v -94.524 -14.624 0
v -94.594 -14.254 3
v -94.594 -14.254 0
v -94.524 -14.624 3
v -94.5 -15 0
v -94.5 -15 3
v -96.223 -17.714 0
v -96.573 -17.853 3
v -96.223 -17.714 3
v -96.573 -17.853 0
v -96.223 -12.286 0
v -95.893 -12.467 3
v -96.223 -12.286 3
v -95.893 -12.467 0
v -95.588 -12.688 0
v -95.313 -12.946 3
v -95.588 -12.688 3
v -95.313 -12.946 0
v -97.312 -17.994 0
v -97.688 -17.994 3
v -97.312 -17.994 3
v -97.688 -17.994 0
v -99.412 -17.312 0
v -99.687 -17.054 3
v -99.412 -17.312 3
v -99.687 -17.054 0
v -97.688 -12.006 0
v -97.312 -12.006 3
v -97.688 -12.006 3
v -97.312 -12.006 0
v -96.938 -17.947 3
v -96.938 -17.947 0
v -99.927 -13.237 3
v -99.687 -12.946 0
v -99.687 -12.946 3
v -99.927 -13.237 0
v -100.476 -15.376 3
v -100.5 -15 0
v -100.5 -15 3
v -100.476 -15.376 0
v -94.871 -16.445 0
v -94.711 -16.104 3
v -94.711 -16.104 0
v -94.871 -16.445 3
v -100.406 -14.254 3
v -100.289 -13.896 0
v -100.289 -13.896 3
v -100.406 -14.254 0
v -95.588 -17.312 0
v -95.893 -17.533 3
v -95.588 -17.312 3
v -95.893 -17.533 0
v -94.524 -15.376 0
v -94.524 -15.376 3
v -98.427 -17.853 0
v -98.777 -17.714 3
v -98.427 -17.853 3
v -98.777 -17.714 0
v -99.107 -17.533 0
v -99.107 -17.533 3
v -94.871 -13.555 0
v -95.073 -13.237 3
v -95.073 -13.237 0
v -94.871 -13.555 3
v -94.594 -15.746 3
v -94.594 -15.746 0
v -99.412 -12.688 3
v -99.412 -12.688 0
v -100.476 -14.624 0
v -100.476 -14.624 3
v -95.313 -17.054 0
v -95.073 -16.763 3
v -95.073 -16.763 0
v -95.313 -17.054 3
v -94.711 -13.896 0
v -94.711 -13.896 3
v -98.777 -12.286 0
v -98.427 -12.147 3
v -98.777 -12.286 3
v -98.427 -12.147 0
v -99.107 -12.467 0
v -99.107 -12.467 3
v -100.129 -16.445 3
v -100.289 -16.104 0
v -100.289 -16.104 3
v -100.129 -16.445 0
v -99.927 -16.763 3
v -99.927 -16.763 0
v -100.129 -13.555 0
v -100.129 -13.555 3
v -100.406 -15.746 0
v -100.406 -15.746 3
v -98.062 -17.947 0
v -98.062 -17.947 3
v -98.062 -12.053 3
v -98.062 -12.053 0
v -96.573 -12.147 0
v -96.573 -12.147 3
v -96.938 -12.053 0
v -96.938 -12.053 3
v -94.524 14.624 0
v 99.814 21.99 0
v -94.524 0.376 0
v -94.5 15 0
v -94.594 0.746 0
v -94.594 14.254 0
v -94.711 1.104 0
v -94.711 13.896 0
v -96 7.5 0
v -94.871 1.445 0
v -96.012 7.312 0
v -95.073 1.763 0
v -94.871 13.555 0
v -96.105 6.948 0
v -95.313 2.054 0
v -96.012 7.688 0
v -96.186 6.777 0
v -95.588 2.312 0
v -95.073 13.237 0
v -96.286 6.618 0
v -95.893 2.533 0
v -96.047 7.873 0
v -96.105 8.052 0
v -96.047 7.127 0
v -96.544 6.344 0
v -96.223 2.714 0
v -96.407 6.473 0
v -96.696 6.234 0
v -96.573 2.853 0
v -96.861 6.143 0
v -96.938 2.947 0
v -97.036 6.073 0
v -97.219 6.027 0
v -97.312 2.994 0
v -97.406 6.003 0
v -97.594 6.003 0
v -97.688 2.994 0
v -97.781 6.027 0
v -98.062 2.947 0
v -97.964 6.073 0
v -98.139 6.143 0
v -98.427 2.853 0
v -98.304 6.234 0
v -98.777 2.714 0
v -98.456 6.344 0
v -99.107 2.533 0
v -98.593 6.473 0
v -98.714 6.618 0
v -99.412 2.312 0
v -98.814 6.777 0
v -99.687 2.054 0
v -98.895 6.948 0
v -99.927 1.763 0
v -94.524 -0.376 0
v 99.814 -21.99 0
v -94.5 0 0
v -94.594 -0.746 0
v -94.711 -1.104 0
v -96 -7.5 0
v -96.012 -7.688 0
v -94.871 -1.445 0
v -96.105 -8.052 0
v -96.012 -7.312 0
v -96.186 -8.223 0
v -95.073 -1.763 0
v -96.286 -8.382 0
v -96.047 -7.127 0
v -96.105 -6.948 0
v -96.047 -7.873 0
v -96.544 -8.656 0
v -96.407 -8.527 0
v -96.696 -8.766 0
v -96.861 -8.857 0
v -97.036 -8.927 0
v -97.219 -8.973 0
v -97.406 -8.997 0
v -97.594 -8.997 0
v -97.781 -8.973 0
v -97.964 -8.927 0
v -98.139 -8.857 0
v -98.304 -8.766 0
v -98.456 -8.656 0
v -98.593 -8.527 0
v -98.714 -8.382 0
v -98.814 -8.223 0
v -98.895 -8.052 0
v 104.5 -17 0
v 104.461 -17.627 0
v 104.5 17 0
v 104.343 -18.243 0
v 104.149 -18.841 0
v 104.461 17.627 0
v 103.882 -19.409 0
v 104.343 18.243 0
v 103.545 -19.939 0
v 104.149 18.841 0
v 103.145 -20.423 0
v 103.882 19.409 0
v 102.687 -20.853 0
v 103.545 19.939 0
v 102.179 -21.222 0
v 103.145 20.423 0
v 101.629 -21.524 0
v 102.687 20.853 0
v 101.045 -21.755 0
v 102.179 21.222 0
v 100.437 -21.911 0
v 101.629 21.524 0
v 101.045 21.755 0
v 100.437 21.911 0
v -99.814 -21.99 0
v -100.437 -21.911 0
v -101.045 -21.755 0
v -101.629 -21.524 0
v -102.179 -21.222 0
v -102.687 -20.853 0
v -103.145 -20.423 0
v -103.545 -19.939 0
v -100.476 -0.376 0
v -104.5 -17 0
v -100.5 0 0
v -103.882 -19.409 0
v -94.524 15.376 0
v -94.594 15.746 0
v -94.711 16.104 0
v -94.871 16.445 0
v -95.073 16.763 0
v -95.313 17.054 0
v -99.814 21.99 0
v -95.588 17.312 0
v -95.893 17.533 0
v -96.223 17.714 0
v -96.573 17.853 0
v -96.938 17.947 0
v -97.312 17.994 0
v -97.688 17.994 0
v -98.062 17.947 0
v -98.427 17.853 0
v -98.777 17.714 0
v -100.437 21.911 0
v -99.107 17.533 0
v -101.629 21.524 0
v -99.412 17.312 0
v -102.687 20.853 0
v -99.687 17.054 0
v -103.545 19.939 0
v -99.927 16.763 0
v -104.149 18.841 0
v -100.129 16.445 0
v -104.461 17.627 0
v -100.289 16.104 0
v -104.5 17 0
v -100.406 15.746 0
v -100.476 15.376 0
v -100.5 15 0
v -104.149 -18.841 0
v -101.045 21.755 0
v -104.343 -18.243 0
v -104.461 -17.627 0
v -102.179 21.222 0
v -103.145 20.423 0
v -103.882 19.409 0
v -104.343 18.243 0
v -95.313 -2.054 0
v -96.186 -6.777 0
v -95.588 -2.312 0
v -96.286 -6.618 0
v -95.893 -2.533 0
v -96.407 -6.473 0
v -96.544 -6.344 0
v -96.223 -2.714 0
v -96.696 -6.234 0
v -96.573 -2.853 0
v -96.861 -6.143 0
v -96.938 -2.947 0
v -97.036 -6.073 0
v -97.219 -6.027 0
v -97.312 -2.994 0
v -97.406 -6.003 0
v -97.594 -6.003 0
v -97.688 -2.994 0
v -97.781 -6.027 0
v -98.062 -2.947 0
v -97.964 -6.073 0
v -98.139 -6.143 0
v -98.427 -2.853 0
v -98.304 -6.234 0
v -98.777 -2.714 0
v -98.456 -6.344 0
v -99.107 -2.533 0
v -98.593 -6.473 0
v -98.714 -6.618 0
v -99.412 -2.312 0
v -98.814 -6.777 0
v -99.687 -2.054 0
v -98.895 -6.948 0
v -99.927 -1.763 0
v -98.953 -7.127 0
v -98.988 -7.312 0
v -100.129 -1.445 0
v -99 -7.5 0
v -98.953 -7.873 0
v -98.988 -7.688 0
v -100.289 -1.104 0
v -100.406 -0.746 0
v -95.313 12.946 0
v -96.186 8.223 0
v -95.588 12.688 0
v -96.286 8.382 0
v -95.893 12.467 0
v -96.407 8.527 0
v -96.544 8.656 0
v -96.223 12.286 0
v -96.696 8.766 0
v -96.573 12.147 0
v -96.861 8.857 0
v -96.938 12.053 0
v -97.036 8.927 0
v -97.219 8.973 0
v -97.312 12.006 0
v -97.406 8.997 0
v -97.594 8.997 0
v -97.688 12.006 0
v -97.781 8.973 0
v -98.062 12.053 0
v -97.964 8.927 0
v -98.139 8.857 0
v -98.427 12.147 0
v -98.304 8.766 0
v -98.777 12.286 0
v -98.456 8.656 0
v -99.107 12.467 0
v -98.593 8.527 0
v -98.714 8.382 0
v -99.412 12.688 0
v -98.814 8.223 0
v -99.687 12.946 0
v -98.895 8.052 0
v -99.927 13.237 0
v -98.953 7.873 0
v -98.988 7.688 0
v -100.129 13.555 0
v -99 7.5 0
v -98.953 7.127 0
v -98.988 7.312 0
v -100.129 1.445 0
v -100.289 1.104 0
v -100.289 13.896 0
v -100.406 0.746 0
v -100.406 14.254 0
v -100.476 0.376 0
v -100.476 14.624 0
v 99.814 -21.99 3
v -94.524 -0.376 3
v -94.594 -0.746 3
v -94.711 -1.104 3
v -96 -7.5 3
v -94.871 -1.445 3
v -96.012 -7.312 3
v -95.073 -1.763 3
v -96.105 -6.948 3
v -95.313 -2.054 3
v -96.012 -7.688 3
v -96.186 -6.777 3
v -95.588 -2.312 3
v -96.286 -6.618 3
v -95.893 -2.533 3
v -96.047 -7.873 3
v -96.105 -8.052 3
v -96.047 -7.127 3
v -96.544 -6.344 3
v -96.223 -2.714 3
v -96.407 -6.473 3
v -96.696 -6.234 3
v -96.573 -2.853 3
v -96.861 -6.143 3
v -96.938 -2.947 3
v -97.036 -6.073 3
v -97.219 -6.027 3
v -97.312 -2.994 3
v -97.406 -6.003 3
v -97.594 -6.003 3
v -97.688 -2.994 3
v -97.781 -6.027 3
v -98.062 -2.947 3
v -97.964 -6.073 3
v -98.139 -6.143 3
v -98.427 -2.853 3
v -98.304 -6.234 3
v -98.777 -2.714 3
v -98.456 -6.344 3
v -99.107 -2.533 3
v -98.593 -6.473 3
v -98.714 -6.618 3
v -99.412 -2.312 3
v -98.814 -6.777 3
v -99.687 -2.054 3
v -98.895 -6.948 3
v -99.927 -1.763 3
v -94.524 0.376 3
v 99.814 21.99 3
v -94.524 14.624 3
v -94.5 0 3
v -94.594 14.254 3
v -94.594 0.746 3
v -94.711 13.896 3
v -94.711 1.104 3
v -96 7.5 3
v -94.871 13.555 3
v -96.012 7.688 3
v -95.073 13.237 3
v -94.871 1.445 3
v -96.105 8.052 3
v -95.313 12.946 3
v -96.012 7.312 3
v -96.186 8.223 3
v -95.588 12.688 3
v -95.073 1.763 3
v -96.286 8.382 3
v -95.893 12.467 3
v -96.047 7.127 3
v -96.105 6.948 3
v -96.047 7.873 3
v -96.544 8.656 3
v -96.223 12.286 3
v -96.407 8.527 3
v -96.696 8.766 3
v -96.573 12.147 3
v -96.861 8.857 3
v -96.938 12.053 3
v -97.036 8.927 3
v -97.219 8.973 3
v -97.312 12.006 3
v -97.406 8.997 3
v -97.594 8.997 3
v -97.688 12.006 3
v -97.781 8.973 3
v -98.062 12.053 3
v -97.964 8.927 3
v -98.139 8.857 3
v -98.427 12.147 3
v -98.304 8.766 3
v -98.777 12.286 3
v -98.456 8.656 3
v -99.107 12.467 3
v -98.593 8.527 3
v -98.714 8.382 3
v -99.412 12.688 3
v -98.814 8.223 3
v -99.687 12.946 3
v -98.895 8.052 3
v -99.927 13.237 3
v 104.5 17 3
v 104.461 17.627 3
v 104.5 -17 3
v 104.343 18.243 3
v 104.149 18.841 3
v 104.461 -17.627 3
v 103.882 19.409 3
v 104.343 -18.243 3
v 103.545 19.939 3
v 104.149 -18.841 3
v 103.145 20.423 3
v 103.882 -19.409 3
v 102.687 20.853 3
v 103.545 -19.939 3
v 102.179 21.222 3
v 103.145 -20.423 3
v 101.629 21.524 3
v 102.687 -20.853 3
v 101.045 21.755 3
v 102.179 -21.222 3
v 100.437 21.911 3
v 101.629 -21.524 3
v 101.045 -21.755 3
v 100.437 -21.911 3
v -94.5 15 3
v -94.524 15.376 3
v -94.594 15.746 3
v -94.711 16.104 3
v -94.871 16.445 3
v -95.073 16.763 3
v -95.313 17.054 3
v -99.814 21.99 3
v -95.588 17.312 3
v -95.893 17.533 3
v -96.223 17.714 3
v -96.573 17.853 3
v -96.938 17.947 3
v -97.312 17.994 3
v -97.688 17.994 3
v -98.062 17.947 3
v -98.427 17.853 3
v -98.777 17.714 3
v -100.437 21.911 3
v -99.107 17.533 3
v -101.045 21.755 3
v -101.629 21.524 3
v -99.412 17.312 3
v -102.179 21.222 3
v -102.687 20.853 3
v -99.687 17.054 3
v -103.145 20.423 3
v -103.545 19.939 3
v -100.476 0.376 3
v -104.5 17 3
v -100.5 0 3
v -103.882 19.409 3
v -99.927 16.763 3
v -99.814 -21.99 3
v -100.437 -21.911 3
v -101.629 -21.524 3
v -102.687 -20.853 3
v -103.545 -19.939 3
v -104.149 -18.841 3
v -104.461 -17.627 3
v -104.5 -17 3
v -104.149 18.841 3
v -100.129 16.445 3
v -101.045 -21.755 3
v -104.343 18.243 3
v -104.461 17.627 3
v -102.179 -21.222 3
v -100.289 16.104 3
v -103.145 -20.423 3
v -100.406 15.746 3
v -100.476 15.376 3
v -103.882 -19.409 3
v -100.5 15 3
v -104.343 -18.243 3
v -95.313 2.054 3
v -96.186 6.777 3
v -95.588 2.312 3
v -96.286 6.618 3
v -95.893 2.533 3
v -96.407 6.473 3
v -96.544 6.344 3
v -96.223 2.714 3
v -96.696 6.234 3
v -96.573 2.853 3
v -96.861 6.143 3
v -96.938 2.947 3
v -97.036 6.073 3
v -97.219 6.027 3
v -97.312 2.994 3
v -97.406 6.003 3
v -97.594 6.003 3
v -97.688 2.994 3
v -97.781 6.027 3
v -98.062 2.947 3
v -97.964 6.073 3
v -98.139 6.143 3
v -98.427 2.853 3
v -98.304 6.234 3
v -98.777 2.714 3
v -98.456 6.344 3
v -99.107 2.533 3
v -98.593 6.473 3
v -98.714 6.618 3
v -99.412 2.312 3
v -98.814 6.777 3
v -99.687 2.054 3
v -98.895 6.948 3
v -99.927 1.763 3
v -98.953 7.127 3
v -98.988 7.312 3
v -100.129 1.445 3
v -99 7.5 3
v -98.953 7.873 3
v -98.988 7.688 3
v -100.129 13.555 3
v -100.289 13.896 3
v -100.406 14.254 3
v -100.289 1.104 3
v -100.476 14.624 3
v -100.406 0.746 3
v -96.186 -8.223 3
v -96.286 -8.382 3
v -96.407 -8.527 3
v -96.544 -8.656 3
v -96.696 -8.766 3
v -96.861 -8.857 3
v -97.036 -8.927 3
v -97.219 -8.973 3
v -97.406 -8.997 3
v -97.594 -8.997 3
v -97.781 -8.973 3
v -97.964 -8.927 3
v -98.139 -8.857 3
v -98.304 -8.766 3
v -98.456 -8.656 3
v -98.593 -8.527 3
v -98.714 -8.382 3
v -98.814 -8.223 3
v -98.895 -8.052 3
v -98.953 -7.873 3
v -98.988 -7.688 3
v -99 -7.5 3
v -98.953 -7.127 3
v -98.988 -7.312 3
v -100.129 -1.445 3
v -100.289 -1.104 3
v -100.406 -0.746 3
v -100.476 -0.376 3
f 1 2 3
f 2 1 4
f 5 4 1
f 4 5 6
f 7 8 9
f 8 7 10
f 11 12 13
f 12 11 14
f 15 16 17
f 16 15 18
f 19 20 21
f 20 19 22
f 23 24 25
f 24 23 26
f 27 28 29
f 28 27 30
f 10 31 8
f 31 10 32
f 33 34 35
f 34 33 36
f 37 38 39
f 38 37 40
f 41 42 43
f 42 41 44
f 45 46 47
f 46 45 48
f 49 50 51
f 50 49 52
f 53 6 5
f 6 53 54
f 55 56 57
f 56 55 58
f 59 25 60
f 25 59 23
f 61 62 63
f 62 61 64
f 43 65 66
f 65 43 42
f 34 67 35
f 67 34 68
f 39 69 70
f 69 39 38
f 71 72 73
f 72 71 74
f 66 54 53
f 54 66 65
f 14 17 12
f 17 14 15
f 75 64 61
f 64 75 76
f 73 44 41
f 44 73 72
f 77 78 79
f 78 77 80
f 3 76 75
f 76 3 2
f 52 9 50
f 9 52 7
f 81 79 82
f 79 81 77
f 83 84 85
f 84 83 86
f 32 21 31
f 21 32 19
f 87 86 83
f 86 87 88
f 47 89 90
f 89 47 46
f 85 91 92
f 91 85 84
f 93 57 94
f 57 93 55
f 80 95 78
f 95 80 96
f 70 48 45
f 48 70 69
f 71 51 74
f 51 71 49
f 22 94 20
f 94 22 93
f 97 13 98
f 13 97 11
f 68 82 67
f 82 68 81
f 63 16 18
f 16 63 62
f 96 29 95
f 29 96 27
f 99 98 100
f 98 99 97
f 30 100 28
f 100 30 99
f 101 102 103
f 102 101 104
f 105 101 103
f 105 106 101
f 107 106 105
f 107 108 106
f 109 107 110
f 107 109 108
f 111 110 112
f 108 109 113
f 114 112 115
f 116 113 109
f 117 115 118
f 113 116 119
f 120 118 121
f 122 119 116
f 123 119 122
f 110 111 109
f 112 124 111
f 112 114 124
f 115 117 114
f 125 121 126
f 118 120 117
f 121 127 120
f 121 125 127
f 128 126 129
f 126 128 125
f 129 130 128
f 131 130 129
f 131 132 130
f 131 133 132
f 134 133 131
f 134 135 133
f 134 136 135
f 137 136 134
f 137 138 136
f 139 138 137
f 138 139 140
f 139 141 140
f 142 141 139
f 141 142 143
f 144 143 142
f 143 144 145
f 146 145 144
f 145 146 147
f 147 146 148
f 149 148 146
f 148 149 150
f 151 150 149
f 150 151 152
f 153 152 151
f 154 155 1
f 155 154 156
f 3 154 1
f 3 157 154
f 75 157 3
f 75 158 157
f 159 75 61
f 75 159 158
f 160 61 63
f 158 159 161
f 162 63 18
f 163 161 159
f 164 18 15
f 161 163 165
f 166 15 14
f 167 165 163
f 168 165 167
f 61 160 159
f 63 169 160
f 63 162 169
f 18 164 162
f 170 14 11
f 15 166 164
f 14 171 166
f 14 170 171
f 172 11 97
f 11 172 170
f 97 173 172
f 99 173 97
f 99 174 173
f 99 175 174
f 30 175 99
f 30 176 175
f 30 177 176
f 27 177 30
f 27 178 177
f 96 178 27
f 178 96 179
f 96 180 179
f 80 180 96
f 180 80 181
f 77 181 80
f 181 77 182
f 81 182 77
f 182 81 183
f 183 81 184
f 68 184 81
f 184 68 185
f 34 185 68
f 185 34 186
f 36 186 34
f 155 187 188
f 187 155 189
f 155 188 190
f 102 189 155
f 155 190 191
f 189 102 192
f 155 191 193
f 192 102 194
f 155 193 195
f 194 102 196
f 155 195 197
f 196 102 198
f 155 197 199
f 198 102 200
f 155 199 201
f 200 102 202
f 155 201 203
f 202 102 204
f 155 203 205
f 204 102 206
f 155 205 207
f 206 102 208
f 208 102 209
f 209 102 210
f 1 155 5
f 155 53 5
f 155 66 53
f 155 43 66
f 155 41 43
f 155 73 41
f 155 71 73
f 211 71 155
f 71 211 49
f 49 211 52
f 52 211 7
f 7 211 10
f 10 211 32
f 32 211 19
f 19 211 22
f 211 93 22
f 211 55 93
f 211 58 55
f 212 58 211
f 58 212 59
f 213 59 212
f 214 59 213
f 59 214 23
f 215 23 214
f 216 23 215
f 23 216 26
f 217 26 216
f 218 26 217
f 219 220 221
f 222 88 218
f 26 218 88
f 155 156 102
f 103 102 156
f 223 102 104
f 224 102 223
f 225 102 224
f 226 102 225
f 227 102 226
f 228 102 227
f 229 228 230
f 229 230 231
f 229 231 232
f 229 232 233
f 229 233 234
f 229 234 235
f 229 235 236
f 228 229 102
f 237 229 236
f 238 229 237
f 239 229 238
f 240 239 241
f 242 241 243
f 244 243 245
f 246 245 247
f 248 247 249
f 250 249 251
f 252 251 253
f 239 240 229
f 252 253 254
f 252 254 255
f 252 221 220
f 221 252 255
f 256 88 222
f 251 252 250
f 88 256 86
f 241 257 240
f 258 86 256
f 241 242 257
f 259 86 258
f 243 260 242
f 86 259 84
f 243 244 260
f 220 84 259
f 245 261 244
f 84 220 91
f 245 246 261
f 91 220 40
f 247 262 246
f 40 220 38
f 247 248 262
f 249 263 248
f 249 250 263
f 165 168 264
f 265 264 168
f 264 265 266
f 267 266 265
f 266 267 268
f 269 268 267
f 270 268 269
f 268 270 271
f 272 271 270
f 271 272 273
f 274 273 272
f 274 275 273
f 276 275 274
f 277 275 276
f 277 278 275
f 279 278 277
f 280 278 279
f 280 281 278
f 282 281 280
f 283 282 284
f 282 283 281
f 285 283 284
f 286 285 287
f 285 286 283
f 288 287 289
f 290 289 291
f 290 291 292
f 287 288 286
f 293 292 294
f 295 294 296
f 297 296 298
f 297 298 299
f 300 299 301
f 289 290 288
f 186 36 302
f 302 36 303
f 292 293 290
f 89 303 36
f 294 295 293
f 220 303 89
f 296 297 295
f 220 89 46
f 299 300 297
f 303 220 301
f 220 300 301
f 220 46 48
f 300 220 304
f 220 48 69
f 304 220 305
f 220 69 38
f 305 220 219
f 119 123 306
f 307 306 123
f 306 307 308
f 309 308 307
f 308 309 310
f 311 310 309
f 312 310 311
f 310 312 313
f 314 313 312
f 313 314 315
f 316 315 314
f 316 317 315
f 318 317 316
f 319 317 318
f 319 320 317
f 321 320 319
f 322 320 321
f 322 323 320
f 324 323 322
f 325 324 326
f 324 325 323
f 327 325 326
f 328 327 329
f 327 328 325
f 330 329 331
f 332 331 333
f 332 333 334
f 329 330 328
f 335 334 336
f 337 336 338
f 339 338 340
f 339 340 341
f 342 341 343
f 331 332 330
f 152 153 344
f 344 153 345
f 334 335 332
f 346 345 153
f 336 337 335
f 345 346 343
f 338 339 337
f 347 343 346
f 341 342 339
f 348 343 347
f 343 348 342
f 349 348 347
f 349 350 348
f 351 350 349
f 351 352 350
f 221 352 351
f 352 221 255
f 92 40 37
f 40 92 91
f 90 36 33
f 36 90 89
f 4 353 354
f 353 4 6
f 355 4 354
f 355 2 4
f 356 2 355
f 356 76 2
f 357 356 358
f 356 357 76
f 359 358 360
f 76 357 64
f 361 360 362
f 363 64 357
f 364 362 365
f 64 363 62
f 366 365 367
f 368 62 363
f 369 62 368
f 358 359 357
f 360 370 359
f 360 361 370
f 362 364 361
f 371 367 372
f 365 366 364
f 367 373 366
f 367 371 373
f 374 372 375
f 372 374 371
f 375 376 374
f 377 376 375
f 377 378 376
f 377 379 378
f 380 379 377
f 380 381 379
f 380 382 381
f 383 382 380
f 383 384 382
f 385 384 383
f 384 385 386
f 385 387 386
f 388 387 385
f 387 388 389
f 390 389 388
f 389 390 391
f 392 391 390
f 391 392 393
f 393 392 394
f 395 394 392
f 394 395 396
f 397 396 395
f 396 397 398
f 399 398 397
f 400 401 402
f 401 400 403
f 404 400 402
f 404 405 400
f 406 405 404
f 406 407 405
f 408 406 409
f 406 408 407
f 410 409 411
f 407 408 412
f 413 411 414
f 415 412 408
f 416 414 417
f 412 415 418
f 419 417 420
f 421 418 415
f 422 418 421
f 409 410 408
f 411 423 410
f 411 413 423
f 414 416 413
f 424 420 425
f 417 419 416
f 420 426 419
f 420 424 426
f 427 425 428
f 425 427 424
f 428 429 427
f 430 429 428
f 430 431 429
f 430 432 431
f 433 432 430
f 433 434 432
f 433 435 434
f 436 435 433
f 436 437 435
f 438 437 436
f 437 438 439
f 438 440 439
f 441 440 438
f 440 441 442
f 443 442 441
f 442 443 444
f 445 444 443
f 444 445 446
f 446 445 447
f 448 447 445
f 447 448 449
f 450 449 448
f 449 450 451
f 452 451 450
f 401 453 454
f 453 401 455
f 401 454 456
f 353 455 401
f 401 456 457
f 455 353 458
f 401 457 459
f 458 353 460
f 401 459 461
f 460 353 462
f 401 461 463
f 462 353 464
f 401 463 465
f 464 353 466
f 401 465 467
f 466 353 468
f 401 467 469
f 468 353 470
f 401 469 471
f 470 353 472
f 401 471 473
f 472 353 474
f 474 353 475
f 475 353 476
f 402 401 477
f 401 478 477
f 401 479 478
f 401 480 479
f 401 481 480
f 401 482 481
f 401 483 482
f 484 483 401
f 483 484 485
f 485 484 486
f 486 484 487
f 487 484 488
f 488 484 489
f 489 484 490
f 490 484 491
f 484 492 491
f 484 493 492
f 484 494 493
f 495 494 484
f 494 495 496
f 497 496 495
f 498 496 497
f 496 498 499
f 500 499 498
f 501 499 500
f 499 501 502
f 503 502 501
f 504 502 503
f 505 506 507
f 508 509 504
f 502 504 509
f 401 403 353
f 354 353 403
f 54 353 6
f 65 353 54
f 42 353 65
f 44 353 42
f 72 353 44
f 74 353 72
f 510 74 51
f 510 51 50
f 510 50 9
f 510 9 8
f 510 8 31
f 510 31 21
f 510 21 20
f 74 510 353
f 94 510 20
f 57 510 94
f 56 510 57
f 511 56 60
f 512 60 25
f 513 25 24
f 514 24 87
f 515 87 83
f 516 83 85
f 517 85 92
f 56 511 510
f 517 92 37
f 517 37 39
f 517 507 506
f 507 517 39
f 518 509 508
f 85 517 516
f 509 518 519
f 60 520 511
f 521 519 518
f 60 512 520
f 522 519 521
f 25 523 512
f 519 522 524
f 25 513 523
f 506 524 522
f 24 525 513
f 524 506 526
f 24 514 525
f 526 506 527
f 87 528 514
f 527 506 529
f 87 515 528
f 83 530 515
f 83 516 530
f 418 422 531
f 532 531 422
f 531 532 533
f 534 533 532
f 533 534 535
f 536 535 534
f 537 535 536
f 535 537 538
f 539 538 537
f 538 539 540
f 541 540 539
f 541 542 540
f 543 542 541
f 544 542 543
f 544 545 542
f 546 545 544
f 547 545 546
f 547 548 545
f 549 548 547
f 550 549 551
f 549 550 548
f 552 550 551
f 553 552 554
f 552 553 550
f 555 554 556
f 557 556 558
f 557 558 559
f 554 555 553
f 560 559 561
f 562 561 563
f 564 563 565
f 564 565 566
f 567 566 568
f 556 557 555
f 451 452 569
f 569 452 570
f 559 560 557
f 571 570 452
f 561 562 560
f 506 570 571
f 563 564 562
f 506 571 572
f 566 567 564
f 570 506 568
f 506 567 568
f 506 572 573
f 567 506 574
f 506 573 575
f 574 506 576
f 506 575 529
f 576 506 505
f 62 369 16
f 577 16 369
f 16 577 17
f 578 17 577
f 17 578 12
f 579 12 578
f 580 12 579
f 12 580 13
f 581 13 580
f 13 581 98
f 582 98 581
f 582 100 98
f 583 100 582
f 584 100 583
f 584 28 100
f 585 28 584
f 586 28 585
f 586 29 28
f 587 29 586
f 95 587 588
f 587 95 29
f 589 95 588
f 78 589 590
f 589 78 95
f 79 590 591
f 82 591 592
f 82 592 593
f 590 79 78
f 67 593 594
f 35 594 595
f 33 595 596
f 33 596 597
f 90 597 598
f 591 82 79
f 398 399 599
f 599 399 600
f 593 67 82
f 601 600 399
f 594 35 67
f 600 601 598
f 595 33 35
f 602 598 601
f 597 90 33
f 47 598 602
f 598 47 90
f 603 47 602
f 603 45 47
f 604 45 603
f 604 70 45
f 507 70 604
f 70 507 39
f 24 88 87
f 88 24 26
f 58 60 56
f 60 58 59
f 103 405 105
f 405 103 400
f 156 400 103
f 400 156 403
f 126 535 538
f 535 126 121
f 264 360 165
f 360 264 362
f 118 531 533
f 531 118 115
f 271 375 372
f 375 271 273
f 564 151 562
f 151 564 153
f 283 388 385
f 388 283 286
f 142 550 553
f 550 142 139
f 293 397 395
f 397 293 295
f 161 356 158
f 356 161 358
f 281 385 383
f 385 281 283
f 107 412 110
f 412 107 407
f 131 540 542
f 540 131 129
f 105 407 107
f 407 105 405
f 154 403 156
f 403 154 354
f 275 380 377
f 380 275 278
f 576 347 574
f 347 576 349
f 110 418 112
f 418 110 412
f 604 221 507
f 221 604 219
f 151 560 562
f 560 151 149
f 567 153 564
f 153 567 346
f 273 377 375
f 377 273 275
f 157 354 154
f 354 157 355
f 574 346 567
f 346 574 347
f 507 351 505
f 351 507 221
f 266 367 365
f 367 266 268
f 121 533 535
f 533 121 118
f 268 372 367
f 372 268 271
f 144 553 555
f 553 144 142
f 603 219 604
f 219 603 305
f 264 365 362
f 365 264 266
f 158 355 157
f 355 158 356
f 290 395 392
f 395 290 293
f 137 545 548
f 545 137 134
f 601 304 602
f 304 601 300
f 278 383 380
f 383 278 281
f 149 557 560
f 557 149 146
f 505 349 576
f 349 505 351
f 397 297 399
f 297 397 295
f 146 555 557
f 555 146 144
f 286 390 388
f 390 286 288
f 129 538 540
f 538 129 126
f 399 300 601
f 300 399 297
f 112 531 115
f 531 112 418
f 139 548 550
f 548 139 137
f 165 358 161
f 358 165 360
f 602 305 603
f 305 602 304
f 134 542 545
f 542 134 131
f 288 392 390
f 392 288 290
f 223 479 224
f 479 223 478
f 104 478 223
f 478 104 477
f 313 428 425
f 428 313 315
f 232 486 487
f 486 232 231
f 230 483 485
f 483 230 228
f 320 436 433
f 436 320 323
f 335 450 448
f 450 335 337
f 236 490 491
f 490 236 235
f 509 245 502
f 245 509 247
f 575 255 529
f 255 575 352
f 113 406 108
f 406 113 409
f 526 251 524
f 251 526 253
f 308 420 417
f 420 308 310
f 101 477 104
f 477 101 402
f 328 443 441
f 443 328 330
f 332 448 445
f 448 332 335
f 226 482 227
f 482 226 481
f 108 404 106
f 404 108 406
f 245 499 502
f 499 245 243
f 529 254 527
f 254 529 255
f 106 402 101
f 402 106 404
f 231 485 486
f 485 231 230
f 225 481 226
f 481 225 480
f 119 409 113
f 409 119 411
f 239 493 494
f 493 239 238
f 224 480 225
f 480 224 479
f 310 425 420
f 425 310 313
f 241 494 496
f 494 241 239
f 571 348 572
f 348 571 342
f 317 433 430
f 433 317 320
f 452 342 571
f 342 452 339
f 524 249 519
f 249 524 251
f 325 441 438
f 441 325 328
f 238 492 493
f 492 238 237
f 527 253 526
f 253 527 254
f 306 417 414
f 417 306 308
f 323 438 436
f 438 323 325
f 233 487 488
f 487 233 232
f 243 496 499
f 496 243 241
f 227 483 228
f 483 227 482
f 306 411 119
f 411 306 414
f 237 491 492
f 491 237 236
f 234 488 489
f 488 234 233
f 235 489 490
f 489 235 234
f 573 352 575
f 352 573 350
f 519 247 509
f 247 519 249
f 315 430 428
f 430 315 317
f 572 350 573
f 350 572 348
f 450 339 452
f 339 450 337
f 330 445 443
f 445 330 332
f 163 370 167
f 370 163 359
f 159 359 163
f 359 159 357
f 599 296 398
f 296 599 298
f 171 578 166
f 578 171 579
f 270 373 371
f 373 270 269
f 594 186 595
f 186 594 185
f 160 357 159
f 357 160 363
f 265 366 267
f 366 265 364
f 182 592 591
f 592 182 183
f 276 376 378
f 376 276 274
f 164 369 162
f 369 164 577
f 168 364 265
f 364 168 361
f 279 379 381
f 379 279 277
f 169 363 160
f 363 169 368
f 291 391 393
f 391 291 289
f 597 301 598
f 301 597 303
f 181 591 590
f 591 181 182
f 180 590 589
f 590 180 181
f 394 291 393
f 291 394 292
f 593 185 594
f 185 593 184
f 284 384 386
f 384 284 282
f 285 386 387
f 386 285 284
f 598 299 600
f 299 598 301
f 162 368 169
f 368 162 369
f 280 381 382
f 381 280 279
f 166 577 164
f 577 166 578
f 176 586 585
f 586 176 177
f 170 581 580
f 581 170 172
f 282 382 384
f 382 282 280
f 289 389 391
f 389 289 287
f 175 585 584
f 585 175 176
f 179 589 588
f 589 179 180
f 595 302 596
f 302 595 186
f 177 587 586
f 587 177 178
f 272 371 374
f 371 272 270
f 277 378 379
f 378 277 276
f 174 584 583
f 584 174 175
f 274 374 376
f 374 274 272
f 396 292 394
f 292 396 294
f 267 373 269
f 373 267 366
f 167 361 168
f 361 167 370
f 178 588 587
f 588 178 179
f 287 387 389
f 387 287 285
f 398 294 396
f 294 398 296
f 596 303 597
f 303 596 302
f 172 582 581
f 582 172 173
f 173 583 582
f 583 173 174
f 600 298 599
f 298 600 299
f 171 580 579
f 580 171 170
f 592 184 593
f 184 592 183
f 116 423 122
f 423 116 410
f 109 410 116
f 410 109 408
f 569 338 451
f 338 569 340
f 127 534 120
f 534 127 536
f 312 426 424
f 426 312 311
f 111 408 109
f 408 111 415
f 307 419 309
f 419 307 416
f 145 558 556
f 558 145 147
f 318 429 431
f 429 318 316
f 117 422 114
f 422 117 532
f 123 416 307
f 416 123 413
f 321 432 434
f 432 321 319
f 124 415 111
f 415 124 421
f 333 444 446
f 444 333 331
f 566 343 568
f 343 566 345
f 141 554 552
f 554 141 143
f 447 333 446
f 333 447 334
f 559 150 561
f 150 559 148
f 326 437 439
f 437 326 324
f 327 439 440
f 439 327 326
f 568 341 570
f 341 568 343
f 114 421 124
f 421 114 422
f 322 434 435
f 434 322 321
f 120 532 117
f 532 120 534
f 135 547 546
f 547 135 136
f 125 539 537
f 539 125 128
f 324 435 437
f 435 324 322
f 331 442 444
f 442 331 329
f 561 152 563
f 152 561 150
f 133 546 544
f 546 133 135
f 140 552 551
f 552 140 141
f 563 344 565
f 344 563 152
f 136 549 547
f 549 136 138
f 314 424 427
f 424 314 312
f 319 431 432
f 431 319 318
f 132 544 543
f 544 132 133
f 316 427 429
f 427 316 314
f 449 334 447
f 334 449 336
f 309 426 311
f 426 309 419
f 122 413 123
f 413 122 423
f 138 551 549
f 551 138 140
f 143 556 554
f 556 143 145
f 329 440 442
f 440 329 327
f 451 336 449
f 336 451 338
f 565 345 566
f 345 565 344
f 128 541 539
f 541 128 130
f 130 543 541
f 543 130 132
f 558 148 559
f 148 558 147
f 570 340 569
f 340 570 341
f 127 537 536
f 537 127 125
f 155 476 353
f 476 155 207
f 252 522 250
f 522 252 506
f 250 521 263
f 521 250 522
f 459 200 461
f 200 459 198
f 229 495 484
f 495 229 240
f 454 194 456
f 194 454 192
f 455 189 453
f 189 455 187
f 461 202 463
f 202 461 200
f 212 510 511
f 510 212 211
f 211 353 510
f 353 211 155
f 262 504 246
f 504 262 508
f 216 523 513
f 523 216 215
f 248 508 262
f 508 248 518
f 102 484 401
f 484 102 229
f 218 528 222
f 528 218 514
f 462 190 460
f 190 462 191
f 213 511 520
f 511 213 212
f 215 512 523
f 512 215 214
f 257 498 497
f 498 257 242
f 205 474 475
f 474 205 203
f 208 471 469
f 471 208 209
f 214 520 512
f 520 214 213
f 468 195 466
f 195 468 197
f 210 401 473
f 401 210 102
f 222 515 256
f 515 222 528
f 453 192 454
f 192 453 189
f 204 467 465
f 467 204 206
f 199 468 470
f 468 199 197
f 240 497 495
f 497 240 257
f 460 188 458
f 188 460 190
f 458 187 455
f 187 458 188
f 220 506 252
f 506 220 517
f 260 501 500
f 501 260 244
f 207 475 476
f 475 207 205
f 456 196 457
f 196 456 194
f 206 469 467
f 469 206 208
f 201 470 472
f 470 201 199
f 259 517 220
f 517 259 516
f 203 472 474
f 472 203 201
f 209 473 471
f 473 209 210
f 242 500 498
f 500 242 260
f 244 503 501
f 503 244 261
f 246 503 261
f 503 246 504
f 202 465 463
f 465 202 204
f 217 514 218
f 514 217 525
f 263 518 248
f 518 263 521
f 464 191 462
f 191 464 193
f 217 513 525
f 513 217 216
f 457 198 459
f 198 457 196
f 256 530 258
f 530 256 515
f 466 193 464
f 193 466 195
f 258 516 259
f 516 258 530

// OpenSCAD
$fn = 50;


difference() {
	union() {
		hull() {
			translate(v = [-99.5000000000, 17.0000000000, 0]) {
				cylinder(h = 3, r = 5);
			}
			translate(v = [99.5000000000, 17.0000000000, 0]) {
				cylinder(h = 3, r = 5);
			}
			translate(v = [-99.5000000000, -17.0000000000, 0]) {
				cylinder(h = 3, r = 5);
			}
			translate(v = [99.5000000000, -17.0000000000, 0]) {
				cylinder(h = 3, r = 5);
			}
		}
	}
	union() {
		translate(v = [-97.5000000000, -15.0000000000, 0]) {
			cylinder(h = 3, r = 3.0000000000);
		}
		translate(v = [-97.5000000000, 0.0000000000, 0]) {
			cylinder(h = 3, r = 3.0000000000);
		}
		translate(v = [-97.5000000000, 15.0000000000, 0]) {
			cylinder(h = 3, r = 3.0000000000);
		}
		translate(v = [-97.5000000000, -15.0000000000, 0]) {
			cylinder(h = 3, r = 1.5000000000);
		}
		translate(v = [-97.5000000000, -7.5000000000, 0]) {
			cylinder(h = 3, r = 1.5000000000);
		}
		translate(v = [-97.5000000000, 0.0000000000, 0]) {
			cylinder(h = 3, r = 1.5000000000);
		}
		translate(v = [-97.5000000000, 7.5000000000, 0]) {
			cylinder(h = 3, r = 1.5000000000);
		}
		translate(v = [-97.5000000000, 15.0000000000, 0]) {
			cylinder(h = 3, r = 1.5000000000);
		}
		translate(v = [-97.5000000000, -15.0000000000, 0]) {
			cylinder(h = 3, r = 1.5000000000);
		}
		translate(v = [-97.5000000000, -7.5000000000, 0]) {
			cylinder(h = 3, r = 1.5000000000);
		}
		translate(v = [-97.5000000000, 0.0000000000, 0]) {
			cylinder(h = 3, r = 1.5000000000);
		}
		translate(v = [-97.5000000000, 7.5000000000, 0]) {
			cylinder(h = 3, r = 1.5000000000);
		}
		translate(v = [-97.5000000000, 15.0000000000, 0]) {
			cylinder(h = 3, r = 1.5000000000);
		}
		translate(v = [-97.5000000000, -15.0000000000, 0]) {
			cylinder(h = 3, r = 1.5000000000);
		}
		translate(v = [-97.5000000000, -7.5000000000, 0]) {
			cylinder(h = 3, r = 1.5000000000);
		}
		translate(v = [-97.5000000000, 0.0000000000, 0]) {
			cylinder(h = 3, r = 1.5000000000);
		}
		translate(v = [-97.5000000000, 7.5000000000, 0]) {
			cylinder(h = 3, r = 1.5000000000);
		}
		translate(v = [-97.5000000000, 15.0000000000, 0]) {
			cylinder(h = 3, r = 1.5000000000);
		}
	}
}
